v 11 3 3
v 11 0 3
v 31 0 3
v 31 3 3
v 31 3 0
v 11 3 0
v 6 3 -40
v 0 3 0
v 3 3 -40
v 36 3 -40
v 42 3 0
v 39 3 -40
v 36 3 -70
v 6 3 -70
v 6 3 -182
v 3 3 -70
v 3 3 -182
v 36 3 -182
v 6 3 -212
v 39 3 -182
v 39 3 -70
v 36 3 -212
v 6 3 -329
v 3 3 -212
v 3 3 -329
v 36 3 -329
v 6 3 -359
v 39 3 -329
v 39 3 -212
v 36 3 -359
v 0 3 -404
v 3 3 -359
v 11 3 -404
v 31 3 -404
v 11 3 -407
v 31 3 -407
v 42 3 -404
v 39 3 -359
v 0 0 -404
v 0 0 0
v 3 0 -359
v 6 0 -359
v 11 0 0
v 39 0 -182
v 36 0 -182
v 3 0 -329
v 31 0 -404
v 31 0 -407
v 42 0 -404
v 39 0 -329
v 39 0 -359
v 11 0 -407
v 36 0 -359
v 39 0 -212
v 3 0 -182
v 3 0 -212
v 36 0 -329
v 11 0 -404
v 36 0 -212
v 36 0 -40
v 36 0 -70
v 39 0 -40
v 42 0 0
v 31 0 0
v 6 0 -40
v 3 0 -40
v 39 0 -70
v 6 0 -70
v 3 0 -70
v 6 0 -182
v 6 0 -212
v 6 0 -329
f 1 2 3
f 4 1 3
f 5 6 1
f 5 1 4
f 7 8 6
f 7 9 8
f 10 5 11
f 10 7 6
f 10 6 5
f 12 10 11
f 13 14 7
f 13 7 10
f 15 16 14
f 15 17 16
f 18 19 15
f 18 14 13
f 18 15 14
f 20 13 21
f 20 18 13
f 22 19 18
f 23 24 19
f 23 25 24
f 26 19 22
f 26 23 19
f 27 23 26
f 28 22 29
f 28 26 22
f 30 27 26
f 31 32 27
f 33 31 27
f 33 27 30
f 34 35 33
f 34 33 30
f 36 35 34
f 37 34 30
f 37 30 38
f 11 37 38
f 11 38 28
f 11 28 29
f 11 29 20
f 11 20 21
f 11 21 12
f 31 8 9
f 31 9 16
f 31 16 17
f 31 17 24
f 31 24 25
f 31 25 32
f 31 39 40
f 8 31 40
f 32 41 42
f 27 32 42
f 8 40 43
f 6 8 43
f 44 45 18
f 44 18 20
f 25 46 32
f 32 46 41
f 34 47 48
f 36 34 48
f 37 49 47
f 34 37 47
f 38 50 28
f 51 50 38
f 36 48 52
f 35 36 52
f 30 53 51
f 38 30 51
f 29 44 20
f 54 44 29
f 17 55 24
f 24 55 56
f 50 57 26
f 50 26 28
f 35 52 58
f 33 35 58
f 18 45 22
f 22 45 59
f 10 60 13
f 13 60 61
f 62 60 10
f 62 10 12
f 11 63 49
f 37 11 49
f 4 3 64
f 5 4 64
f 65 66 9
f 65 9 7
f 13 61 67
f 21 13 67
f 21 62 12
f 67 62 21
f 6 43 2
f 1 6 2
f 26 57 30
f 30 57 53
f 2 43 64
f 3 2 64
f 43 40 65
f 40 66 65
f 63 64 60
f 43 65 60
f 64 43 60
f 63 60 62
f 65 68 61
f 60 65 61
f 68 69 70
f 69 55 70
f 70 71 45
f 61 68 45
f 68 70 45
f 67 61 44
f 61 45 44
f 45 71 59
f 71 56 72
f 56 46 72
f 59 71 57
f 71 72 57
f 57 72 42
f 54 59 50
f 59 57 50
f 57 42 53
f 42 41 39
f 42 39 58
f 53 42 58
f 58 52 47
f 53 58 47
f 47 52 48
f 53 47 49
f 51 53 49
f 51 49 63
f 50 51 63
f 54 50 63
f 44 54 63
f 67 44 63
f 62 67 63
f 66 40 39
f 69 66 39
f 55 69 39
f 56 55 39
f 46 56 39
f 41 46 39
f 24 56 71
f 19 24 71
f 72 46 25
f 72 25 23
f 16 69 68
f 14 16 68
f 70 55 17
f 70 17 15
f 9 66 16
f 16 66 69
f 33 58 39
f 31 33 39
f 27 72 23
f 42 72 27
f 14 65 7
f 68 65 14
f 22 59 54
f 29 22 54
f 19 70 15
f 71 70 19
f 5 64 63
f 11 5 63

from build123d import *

# Parameters (mm, degrees)
SKETCH1_W           = 3
SKETCH1_H           = 30
BOSS_EXTRUDE1_DEPTH = 3


with BuildPart() as part:
    # Sketch1 → Boss-Extrude1 (new body)
    with BuildSketch(Plane(origin=(0, 0, 0), x_dir=(1, 0, 0), z_dir=(0, 1, 0))):
        Polygon((31, 0), (42, 0), (42, 404), (31, 404), (31, 407), (11, 407), (11, 404), (0, 404), (0, 0), (11, 0), (11, -3), (31, -3), align=None)
        with Locations((37.5, 344)):
            Rectangle(SKETCH1_W, SKETCH1_H, mode=Mode.SUBTRACT)
        with Locations((37.5, 197)):
            Rectangle(SKETCH1_W, SKETCH1_H, mode=Mode.SUBTRACT)
        with Locations((37.5, 55)):
            Rectangle(SKETCH1_W, SKETCH1_H, mode=Mode.SUBTRACT)
        with Locations((4.5, 55)):
            Rectangle(SKETCH1_W, SKETCH1_H, mode=Mode.SUBTRACT)
        with Locations((4.5, 197)):
            Rectangle(SKETCH1_W, SKETCH1_H, mode=Mode.SUBTRACT)
        with Locations((4.5, 344)):
            Rectangle(SKETCH1_W, SKETCH1_H, mode=Mode.SUBTRACT)
    extrude(amount=BOSS_EXTRUDE1_DEPTH)


solid = part.part
